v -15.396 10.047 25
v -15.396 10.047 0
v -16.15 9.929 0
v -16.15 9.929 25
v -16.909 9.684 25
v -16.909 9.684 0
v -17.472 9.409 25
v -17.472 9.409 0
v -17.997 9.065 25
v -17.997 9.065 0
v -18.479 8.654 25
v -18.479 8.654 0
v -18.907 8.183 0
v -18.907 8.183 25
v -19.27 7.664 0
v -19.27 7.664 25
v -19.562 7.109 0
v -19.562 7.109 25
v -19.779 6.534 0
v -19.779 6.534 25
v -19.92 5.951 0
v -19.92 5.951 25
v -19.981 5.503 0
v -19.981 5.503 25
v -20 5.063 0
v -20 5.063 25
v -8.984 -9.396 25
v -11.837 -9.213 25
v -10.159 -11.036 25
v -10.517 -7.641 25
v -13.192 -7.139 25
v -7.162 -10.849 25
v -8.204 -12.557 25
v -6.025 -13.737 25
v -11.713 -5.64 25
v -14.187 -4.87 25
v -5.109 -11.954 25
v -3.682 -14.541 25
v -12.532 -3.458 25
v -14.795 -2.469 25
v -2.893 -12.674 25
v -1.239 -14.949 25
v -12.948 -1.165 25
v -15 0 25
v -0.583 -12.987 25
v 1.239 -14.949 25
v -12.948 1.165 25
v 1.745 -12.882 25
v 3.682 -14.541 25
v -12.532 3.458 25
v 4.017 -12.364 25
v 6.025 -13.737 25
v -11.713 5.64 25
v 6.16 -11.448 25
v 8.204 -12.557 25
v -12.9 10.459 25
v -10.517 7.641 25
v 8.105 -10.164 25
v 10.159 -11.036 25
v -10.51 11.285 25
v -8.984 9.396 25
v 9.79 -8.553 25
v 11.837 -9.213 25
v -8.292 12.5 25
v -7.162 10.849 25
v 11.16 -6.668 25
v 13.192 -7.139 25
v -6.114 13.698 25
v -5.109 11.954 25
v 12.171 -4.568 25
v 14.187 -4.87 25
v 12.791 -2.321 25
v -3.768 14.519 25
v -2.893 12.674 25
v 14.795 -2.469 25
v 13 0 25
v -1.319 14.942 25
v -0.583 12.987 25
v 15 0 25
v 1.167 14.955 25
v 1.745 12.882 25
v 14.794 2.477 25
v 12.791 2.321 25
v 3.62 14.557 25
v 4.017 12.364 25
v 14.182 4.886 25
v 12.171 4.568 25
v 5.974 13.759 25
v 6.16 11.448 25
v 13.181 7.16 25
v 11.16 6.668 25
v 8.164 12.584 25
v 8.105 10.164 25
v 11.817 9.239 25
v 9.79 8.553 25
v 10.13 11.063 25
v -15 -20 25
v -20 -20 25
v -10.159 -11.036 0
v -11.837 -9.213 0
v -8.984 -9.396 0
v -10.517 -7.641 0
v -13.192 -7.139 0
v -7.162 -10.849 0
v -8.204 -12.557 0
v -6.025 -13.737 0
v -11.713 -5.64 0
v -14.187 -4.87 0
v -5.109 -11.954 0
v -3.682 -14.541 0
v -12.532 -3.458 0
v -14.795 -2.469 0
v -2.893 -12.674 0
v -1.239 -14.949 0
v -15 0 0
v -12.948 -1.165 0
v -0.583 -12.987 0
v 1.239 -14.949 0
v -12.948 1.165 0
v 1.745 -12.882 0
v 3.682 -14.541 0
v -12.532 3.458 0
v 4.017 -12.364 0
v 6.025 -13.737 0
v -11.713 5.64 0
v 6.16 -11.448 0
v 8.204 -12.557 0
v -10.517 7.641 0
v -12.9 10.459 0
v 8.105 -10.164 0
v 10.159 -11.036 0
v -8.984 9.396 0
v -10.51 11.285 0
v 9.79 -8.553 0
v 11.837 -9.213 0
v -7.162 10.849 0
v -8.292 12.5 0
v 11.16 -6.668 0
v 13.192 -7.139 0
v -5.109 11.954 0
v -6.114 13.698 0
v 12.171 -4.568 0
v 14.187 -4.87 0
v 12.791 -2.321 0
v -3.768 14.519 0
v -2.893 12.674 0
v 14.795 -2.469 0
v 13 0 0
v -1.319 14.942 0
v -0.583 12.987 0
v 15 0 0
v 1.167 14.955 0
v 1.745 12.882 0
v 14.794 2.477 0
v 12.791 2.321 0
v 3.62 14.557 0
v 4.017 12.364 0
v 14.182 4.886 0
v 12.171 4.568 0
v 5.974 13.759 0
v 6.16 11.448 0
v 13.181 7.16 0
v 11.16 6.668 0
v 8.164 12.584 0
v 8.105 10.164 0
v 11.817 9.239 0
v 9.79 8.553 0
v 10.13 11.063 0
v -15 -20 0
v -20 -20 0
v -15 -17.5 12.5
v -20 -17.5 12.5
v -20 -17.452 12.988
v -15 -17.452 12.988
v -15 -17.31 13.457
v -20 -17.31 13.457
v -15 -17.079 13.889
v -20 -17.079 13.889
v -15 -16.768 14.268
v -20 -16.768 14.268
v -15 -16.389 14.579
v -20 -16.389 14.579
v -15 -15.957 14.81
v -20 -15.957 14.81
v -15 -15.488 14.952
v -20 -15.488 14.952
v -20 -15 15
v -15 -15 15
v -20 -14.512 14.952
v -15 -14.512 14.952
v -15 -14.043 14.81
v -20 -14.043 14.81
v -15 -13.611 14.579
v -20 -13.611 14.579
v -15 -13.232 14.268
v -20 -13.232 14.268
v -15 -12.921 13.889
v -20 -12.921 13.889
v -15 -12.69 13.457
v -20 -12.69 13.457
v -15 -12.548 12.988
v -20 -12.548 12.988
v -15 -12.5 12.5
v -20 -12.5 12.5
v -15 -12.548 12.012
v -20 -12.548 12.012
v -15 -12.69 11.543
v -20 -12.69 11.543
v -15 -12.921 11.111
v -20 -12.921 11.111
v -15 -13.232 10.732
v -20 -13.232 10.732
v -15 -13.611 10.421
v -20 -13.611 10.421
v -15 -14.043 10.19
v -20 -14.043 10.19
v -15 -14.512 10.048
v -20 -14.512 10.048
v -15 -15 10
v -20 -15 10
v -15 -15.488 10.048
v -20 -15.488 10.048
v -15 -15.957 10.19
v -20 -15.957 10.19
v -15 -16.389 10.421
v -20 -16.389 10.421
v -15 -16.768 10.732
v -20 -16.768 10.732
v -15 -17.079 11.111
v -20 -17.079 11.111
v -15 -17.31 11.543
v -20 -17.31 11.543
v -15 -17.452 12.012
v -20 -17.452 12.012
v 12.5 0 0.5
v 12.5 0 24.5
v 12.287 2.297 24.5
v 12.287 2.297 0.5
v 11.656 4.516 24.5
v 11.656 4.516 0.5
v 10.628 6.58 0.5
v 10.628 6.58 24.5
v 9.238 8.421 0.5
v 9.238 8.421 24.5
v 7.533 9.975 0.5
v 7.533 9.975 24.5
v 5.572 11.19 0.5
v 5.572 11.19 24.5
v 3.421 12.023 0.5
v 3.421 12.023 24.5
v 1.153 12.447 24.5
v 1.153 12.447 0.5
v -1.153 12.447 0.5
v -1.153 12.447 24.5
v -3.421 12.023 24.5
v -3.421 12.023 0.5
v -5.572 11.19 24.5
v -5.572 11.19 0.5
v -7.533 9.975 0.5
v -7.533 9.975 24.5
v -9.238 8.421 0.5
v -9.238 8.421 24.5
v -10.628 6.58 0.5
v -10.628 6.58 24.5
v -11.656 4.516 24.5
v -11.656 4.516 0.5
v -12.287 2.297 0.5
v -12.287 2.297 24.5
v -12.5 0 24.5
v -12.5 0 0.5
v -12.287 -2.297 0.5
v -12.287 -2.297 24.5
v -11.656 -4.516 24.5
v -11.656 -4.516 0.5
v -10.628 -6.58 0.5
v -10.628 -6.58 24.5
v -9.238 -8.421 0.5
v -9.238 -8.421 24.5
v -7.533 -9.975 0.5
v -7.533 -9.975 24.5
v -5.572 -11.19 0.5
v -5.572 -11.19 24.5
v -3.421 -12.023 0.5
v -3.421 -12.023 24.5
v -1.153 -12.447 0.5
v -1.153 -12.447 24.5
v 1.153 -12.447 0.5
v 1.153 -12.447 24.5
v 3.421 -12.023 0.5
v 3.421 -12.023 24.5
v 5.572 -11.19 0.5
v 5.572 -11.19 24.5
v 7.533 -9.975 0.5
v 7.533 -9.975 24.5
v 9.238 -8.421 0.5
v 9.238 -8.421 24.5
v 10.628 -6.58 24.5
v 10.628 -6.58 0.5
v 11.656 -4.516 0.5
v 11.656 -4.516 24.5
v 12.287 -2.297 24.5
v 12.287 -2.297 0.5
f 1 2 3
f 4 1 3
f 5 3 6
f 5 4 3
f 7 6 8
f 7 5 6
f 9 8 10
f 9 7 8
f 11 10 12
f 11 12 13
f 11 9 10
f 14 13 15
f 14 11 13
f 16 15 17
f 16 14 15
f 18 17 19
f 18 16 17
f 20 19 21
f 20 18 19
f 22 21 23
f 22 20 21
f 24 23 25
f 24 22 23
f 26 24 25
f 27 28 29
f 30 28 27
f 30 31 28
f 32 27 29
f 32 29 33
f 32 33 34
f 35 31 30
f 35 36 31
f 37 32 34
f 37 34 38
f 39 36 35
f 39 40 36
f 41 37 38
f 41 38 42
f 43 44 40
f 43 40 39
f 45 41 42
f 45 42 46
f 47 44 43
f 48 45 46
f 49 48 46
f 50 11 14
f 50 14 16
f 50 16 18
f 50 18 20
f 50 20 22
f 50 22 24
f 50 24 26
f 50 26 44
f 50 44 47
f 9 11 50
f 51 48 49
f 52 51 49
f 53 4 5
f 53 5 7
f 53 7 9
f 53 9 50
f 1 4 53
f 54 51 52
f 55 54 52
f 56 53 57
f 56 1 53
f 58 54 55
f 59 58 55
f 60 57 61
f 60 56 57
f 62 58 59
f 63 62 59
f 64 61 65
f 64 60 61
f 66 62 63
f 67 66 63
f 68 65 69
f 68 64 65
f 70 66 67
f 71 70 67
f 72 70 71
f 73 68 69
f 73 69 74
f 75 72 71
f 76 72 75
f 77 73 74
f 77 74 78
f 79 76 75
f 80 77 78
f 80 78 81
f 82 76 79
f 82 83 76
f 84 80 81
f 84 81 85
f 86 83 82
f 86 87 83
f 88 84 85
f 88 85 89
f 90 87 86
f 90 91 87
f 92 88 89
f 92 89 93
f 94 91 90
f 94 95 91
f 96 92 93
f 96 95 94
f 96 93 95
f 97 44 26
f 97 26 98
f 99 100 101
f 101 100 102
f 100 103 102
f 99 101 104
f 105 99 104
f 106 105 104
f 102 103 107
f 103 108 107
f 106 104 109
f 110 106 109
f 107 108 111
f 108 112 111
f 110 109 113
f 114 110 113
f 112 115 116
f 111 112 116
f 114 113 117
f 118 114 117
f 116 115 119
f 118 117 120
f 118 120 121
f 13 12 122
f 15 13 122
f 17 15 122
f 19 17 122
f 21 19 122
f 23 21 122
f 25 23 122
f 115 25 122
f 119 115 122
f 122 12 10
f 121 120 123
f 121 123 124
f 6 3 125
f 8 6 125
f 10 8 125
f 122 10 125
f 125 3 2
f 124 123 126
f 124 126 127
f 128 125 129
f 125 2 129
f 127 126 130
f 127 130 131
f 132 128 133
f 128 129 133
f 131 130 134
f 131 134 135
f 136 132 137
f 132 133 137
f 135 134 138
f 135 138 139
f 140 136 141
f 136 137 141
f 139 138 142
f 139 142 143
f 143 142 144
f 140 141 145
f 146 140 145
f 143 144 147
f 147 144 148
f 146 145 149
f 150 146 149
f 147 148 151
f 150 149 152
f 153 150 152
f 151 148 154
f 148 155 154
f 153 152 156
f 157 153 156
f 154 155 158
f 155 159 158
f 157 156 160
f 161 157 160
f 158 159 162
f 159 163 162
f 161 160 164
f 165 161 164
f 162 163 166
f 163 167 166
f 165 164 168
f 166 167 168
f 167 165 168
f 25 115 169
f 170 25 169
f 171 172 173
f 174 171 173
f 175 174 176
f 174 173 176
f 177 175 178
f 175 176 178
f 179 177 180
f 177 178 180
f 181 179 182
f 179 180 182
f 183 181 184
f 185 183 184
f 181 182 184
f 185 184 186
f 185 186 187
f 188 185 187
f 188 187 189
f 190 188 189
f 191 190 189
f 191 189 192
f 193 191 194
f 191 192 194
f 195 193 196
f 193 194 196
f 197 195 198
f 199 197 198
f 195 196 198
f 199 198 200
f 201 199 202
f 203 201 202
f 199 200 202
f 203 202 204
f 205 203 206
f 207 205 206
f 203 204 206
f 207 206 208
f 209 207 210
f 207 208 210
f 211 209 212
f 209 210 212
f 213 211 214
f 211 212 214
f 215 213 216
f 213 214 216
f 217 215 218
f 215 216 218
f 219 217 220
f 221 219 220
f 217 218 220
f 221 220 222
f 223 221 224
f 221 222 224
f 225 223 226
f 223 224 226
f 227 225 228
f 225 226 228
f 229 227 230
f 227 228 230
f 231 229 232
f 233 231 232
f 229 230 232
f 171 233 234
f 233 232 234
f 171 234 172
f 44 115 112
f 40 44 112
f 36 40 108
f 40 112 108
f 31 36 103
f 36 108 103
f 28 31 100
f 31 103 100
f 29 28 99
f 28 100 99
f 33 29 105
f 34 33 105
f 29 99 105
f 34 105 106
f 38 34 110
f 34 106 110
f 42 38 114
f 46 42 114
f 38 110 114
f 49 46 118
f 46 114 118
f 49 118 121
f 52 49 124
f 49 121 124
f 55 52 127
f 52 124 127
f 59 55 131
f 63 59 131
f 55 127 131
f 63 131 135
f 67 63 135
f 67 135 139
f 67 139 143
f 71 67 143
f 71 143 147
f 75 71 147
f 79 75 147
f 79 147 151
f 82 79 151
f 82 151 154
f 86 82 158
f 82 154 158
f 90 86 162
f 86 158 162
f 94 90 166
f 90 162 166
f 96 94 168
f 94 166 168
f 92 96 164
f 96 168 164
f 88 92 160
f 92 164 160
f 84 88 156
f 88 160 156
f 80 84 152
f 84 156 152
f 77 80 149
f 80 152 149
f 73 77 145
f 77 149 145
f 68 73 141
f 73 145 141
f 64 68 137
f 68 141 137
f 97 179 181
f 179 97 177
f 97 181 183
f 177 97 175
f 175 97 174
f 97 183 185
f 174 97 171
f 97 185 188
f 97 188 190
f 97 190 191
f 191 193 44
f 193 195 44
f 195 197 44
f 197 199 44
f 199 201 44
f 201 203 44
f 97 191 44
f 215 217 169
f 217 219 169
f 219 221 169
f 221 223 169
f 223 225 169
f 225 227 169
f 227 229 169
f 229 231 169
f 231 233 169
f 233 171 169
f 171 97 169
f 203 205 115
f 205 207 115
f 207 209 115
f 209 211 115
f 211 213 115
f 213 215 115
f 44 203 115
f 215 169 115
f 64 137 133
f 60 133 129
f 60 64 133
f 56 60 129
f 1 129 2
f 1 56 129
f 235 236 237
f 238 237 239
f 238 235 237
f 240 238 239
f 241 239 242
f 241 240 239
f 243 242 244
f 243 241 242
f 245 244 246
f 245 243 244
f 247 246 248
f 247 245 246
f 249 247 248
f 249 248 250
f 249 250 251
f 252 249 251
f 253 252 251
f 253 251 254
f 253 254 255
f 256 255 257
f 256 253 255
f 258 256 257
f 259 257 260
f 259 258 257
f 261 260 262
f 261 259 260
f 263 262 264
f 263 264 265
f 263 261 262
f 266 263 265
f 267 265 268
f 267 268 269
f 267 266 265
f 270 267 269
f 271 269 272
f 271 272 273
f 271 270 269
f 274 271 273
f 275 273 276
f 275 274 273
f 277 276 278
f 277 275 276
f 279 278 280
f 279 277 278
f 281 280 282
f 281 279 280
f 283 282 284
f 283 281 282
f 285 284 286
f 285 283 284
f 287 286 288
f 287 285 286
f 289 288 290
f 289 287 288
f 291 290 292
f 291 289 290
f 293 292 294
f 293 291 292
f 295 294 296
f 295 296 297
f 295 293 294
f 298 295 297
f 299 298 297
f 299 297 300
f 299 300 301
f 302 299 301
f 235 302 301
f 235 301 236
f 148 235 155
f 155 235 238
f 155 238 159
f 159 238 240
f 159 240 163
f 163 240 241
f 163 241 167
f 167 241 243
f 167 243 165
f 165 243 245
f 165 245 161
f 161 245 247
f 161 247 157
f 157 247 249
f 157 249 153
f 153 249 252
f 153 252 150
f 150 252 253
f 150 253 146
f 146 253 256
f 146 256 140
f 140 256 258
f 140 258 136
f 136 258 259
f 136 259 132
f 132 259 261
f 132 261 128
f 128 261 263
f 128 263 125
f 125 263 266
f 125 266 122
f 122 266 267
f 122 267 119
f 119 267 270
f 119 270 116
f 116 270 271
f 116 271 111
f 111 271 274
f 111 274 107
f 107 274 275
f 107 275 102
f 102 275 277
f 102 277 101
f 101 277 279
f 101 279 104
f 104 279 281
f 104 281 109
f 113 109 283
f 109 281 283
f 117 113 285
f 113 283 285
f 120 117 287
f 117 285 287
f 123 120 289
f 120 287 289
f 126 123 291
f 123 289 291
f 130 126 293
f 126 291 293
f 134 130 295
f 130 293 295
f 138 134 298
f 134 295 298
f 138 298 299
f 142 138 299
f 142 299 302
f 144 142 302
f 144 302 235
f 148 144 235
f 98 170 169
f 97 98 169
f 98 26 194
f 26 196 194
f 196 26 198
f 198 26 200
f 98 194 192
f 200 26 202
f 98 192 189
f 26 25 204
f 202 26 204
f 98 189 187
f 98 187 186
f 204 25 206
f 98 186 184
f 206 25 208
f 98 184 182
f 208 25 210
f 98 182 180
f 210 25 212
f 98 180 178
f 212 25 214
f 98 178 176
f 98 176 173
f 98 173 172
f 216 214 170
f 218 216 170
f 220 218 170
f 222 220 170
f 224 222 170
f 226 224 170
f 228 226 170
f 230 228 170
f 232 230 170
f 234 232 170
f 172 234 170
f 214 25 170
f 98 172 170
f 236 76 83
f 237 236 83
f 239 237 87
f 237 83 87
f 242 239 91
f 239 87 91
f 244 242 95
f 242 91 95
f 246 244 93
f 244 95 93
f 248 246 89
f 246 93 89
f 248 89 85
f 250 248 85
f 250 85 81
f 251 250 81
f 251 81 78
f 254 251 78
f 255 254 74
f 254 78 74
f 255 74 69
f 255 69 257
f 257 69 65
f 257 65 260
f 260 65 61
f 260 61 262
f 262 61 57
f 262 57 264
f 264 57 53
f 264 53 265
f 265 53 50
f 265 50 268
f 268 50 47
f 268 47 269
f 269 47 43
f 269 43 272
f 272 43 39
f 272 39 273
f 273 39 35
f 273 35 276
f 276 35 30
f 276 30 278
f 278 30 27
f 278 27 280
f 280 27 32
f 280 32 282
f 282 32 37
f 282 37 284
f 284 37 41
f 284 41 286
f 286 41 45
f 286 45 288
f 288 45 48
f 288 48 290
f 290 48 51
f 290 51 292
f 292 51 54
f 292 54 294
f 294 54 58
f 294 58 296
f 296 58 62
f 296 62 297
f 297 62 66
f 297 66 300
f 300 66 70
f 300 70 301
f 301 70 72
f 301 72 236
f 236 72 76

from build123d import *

# Parameters (mm, degrees)
F0_R     = 12.5
F0_W     = 5
F0_H     = 20
F1_DEPTH = 25
F2_R     = 15
F3_R     = 5
F4_R     = 2.5
F5_DEPTH = 5
F6_SIZE  = 0.5


with BuildPart() as f1:
    # F0 (on Top) → F1 (new body)
    with BuildSketch(Plane.XY):
        with BuildLine():
            ThreePointArc((-15, 0), (0, -15), (15, 0))
            ThreePointArc((15, 0), (5.352331, 14.012585), (-11.18034, 10))
            ThreePointArc((-11.18034, 10), (-14.012585, 5.352331), (-15, 0))
        make_face()
        Circle(F0_R, mode=Mode.SUBTRACT)
        with BuildLine():
            ThreePointArc((-15, 0), (-14.012585, 5.352331), (-11.18034, 10))
            Line((-11.18034, 10), (-20, 10))
            Line((-20, 10), (-20, 0))
            Line((-20, 0), (-15, 0))
        make_face()
        with Locations((-17.5, -10)):
            Rectangle(F0_W, F0_H)
    extrude(amount=F1_DEPTH)

    # F2
    f2_edges = [f1.edges().sort_by_distance(p)[0] for p in [
        (-11.18034, 10, 12.5),
    ]]
    fillet(f2_edges, radius=F2_R)

    # F3
    f3_edges = [f1.edges().sort_by_distance(p)[0] for p in [
        (-20, 10, 12.5),
    ]]
    fillet(f3_edges, radius=F3_R)

    # F4 (on face) → F5 (cut)
    with BuildSketch(Plane(origin=(-20, 0, 0), x_dir=(0, -1, 0), z_dir=(-1, 0, 0))):
        with Locations((15, 12.5)):
            Circle(F4_R)
    extrude(amount=-F5_DEPTH, mode=Mode.SUBTRACT)

    # F6
    f6_edges = [f1.edges().sort_by_distance(p)[0] for p in [
        (-12.5, 0, 0),
        (-12.5, 0, 25),
    ]]
    chamfer(f6_edges, length=F6_SIZE)


solid = f1.part
